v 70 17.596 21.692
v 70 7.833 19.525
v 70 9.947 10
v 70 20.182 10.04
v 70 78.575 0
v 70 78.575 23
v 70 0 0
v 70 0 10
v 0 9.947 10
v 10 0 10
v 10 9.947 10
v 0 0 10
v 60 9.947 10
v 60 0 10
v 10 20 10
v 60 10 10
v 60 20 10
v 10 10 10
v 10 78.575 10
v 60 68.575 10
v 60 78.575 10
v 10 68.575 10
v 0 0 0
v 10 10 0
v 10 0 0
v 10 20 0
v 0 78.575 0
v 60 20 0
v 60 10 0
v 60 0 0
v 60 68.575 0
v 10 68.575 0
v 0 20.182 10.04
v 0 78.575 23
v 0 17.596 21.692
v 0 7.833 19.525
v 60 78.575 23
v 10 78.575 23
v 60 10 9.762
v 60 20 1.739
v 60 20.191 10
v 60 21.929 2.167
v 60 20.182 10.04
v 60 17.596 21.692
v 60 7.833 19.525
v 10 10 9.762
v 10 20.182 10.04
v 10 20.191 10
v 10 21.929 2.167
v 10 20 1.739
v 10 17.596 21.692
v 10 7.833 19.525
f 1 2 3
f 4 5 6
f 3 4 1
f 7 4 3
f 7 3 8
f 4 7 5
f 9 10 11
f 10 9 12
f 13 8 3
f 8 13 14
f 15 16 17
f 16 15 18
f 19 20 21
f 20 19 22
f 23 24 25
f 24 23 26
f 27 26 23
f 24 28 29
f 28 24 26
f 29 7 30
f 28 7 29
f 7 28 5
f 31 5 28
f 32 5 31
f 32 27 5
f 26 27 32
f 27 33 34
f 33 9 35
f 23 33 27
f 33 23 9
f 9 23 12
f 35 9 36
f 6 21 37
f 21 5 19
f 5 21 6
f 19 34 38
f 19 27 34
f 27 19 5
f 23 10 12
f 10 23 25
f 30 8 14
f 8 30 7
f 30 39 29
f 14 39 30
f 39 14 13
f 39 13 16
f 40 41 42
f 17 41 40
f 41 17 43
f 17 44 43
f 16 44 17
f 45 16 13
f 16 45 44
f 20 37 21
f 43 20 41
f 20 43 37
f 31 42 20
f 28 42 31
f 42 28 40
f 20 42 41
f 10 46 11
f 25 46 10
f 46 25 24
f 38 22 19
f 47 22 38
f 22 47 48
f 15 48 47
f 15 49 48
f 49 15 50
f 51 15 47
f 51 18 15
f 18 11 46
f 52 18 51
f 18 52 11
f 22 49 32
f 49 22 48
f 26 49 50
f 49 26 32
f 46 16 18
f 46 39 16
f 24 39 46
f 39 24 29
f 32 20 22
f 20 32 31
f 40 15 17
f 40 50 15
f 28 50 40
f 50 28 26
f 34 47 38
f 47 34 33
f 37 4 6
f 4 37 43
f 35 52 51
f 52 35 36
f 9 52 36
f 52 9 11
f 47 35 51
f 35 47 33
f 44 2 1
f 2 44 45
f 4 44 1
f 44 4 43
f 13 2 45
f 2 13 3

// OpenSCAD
lift = 13;
width = 70;
base = 60;
foot = 20;

thick = 10;

frontwedge = 5;

angle = asin(lift/base);
basey = base*cos(angle);


difference(){
    cube([width, foot+basey, thick]);
    
    translate([thick,0,-0.5]){
        cube([width-(2*thick), foot-thick, thick+1]);
    }
    
    translate([thick, foot,-0.5]){
        cube([width-(2*thick), basey-thick, thick+1]);
    }
}

module backwedge() {
    difference() {
        cube([thick, basey, lift]);
        rotate([angle, 0,0]){
            cube([thick, basey/cos(angle), lift]);
        }
    }
}

module frontwedge() {
    rotate([angle,0,0]){
        cube([thick, thick, 2*thick]);
    }
}

translate([0,foot - thick + cos(90-angle)*thick,0]){
    frontwedge();
}

translate([width-thick,foot - thick + cos(90-angle)*thick,0]){
    frontwedge();
}


translate([0,foot,thick]){
    backwedge();
}

translate([width-thick,foot,thick]){
    backwedge();
}
